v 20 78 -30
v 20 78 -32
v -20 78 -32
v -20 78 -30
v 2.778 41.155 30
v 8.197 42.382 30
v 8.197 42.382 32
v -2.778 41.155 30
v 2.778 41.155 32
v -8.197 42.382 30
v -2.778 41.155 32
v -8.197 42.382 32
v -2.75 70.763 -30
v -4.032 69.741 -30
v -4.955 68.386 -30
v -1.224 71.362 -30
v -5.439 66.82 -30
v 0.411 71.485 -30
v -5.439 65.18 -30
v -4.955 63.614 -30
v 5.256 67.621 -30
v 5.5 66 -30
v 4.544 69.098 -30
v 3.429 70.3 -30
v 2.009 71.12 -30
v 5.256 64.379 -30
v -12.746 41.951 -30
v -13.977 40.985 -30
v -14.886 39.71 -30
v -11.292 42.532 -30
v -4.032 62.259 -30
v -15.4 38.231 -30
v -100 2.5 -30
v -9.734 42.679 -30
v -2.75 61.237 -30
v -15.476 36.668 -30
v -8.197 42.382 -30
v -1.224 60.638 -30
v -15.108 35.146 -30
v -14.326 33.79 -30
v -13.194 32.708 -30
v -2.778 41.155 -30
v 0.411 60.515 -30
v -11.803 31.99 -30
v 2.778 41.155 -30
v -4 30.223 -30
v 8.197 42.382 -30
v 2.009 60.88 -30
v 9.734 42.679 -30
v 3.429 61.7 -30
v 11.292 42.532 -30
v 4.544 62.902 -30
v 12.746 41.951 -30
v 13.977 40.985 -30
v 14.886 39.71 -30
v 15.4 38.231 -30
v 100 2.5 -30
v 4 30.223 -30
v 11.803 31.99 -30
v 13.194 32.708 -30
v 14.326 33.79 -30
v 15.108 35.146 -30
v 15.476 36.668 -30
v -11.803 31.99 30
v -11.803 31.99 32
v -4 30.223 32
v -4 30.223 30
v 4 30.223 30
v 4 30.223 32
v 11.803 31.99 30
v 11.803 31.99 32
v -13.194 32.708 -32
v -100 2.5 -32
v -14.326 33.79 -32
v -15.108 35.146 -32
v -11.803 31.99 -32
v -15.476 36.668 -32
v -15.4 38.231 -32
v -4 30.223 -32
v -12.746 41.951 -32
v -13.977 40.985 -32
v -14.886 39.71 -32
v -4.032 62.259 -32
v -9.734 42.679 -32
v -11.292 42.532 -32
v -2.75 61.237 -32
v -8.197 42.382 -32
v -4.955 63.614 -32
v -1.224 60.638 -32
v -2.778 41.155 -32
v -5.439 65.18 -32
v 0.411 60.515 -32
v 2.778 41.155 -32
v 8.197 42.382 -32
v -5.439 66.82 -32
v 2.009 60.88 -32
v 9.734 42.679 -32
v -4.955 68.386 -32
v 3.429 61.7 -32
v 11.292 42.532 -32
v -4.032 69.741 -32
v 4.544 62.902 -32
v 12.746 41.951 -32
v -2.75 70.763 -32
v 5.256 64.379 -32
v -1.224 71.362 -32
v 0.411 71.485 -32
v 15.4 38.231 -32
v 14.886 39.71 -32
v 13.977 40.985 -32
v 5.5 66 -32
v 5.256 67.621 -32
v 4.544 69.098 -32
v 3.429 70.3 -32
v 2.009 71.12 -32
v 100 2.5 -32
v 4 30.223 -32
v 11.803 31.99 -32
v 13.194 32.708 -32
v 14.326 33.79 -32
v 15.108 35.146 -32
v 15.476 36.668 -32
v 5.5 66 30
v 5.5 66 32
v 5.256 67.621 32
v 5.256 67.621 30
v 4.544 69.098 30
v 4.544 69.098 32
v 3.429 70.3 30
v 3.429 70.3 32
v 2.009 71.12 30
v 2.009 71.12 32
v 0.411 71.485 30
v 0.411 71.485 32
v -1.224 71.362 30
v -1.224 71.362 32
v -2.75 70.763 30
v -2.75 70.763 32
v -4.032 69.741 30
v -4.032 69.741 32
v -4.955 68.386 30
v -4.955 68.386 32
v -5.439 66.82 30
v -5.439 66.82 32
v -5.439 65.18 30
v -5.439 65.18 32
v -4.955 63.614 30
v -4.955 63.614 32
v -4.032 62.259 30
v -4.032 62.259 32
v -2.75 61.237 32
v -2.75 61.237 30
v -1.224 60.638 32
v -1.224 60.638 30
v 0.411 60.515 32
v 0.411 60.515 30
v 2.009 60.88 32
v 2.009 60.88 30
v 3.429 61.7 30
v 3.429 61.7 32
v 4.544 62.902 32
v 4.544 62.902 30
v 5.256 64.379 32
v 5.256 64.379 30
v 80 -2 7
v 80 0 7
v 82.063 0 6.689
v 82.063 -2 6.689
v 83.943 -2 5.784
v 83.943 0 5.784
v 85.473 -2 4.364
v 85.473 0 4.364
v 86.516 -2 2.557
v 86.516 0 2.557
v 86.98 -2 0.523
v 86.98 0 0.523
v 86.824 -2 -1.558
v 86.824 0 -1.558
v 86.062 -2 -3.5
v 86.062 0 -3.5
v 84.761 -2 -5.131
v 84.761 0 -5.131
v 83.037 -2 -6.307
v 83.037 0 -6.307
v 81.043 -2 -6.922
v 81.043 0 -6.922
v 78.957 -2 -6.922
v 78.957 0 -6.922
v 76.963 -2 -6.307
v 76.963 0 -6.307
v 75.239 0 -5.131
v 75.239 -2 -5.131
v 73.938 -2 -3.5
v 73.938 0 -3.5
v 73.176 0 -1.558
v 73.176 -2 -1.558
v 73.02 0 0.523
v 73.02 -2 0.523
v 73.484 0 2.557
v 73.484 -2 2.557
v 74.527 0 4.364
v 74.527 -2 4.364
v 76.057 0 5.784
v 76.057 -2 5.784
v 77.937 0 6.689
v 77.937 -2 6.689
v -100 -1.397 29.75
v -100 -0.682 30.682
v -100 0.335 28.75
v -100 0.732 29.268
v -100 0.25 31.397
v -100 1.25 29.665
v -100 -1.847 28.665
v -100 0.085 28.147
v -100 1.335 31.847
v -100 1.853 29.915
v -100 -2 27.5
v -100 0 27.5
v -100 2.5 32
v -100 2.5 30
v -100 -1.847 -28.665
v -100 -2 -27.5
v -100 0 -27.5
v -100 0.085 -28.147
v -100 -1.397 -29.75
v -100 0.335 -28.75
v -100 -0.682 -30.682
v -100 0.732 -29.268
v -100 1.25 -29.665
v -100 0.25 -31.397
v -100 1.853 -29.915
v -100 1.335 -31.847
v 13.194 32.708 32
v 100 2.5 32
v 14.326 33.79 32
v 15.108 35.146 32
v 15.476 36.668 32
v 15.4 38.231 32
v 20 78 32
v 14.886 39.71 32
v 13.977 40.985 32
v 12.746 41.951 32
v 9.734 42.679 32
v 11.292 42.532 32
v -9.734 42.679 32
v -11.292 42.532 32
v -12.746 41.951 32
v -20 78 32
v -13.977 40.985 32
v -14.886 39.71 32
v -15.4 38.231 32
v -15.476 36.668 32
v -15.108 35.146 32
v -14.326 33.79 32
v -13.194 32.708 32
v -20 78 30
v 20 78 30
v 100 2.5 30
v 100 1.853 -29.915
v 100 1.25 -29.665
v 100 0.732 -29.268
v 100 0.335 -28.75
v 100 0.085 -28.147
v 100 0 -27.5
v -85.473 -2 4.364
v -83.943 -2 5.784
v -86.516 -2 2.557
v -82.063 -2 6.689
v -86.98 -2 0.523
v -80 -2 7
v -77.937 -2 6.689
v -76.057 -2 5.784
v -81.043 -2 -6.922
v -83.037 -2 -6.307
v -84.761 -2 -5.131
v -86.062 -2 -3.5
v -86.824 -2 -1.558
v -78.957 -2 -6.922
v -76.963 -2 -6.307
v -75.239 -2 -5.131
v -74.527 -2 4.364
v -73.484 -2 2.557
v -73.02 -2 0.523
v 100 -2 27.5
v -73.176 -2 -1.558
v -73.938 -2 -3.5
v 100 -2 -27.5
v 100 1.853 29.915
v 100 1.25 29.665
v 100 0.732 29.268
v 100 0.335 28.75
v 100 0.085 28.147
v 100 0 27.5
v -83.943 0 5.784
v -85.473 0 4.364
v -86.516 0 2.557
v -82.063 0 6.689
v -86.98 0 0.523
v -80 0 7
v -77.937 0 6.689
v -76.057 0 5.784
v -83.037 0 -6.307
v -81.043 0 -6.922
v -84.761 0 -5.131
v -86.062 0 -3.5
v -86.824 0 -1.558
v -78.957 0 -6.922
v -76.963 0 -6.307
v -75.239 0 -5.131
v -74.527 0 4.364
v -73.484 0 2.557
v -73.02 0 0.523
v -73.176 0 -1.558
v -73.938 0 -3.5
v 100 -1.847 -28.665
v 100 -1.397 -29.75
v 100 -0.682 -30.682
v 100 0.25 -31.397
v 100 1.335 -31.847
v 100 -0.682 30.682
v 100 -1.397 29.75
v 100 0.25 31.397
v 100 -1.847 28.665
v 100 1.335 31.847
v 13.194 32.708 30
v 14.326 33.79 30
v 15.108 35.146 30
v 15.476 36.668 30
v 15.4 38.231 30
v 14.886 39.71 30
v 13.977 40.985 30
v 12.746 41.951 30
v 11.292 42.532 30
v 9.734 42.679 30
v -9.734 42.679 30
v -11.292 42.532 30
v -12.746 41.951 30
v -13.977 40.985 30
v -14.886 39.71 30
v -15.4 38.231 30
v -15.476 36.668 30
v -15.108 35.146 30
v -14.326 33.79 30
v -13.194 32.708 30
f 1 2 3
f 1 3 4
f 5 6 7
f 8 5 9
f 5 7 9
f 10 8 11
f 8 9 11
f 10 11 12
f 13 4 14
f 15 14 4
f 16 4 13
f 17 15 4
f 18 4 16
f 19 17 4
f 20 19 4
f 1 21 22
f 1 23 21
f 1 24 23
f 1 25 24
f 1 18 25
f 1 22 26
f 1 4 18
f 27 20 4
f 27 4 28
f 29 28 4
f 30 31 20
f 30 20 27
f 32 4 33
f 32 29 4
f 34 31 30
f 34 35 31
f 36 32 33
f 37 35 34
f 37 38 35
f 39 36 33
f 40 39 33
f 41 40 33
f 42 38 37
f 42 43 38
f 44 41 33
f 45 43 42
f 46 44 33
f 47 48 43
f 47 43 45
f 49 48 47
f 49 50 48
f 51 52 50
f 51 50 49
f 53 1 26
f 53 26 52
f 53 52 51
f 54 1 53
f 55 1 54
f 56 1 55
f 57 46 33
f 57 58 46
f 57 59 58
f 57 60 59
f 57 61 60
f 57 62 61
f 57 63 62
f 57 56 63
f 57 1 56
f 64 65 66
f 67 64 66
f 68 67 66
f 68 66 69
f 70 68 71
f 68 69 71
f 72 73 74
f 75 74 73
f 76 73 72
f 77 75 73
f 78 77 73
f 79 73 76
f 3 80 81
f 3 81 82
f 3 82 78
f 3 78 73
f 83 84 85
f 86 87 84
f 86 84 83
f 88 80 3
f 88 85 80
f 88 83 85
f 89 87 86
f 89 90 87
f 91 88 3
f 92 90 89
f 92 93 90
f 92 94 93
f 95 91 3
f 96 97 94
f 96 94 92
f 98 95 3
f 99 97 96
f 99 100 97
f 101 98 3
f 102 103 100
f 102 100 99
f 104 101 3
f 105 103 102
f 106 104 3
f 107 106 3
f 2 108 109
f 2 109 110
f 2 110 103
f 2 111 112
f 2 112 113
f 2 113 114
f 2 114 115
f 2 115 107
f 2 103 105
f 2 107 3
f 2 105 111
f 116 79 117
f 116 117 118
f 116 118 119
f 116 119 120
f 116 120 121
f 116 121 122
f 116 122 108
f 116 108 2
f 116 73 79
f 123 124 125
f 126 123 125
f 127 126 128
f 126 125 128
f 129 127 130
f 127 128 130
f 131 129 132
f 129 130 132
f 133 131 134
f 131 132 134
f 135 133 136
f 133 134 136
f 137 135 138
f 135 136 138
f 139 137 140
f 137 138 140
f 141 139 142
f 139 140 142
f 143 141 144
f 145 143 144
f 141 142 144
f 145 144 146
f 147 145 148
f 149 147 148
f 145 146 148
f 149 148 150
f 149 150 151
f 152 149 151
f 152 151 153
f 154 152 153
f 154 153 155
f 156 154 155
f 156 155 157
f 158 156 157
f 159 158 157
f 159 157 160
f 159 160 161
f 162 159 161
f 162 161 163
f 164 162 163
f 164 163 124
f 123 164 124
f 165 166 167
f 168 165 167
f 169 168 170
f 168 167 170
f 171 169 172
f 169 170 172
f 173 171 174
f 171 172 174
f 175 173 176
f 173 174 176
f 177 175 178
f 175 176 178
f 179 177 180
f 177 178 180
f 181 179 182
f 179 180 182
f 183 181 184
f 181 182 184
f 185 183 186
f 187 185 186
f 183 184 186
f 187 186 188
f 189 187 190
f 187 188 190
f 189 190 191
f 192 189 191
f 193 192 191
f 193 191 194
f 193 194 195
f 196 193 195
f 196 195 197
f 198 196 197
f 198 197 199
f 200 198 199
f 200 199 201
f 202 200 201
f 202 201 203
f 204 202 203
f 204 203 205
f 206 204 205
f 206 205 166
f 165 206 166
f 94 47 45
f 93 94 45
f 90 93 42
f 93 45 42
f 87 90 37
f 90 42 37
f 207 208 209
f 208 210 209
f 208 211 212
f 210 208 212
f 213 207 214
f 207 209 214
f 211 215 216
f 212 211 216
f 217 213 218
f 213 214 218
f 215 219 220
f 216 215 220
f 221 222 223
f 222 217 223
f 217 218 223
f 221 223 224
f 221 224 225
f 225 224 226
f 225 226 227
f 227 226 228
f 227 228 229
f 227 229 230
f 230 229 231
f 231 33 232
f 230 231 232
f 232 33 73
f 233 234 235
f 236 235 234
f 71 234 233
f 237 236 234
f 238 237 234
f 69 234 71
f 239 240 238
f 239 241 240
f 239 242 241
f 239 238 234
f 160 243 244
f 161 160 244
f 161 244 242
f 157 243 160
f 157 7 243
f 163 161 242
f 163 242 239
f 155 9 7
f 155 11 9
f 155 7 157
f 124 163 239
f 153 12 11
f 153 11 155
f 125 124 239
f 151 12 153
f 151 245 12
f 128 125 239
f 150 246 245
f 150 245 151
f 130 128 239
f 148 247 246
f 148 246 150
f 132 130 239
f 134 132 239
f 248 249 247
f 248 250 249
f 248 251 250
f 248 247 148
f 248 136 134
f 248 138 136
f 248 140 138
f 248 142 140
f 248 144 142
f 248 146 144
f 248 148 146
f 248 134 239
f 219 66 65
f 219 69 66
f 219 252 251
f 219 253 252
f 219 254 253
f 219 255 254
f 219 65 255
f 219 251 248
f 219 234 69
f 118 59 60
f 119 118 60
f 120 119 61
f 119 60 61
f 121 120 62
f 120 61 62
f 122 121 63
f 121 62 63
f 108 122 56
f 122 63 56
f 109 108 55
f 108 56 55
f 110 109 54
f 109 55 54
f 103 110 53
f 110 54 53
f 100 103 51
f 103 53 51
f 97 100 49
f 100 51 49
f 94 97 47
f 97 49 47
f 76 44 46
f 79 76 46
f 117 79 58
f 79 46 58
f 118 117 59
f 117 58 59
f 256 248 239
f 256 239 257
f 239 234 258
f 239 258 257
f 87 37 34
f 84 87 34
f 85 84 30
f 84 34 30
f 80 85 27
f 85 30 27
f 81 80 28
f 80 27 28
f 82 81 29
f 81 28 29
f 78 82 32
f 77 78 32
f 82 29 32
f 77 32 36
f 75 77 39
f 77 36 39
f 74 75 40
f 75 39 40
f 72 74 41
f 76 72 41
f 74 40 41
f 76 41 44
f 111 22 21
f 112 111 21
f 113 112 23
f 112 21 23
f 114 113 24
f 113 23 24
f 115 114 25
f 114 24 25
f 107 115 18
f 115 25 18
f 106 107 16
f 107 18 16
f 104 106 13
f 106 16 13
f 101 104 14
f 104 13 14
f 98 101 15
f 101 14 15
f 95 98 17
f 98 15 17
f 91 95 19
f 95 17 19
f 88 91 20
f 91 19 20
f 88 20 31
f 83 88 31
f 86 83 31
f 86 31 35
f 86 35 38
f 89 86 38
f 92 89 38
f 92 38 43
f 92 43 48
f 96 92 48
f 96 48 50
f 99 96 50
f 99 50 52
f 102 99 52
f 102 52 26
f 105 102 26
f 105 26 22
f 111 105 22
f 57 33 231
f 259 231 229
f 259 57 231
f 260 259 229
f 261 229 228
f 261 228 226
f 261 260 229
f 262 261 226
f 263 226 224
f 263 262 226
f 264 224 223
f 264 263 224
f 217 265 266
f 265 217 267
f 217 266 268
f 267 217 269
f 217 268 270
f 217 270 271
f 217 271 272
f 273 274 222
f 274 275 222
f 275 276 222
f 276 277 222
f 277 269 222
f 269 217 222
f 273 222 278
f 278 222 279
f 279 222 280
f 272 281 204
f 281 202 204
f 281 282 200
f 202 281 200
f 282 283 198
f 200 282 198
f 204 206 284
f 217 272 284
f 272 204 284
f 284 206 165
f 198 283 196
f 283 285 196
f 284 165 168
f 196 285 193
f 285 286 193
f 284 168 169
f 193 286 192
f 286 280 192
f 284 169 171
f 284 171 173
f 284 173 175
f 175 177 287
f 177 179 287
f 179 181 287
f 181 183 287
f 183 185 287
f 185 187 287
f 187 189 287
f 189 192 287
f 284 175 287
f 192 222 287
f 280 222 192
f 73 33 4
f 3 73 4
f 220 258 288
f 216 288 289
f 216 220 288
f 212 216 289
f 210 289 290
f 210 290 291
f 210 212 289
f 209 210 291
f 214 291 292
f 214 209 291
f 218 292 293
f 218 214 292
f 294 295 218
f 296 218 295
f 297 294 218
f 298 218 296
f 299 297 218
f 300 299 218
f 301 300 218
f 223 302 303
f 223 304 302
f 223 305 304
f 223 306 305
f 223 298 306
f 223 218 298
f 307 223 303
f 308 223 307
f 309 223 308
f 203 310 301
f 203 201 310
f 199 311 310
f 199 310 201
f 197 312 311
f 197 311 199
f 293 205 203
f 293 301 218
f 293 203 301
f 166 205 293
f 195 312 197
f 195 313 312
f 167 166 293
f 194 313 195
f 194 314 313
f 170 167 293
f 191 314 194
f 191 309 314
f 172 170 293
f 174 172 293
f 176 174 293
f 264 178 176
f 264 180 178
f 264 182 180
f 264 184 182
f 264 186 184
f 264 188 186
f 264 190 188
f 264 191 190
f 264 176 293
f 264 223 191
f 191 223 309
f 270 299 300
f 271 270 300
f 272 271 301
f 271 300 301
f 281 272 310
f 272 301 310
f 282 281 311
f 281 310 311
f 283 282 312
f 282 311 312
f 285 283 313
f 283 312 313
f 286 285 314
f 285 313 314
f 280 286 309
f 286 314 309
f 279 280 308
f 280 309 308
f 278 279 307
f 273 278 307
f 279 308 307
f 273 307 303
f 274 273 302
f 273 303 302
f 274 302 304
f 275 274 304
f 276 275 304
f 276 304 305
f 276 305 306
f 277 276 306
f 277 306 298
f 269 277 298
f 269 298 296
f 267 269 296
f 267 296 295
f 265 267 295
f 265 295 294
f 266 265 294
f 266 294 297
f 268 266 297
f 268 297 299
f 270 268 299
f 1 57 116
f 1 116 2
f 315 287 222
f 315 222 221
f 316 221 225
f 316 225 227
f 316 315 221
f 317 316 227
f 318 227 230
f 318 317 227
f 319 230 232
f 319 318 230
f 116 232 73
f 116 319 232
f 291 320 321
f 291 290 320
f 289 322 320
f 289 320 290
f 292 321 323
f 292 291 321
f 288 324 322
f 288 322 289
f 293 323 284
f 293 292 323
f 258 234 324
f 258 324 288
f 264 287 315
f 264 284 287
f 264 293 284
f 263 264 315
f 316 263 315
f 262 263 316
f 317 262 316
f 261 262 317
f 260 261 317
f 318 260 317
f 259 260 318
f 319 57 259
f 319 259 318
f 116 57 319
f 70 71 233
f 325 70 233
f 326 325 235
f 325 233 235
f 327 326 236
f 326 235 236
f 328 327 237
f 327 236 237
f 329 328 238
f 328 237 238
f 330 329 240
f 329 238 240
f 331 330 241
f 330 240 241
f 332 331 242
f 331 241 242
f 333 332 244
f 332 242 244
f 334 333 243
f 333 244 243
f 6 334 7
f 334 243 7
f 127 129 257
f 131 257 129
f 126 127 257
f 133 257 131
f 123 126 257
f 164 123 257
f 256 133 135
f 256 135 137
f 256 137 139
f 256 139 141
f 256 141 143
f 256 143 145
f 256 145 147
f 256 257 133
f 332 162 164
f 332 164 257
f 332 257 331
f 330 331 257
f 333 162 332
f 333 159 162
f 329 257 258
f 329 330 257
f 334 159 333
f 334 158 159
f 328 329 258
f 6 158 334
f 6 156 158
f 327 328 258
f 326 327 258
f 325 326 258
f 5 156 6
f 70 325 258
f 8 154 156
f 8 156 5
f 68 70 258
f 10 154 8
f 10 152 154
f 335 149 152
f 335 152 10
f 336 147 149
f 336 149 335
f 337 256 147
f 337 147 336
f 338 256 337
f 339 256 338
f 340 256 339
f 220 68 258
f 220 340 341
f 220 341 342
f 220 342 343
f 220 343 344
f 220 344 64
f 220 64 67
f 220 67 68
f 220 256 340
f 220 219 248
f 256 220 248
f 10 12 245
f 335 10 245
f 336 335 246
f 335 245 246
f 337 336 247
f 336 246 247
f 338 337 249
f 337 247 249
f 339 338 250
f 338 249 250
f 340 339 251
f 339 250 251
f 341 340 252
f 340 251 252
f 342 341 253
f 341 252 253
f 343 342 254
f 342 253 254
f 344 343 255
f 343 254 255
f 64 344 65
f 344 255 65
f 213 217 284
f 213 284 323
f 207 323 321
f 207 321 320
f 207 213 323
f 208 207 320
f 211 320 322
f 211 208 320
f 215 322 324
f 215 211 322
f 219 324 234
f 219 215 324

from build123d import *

# Parameters (mm, degrees)
SKETCH9_W                      = 200
SKETCH9_H                      = 64
BASE_FLANGE2_DEPTH             = 2
EDGE_FLANGE2_STRIP_W           = 13
EDGE_FLANGE2_STRIP_H           = 2
EDGE_FLANGE2_STRIP_CUT_DEPTH   = 200
EDGE_FLANGE2_STRIP_2_W         = 13
EDGE_FLANGE2_STRIP_2_H         = 2
EDGE_FLANGE2_STRIP_CUT_2_DEPTH = 200
EDGE_FLANGE2_DEPTH             = 200
EDGE_FLANGE2_BEND_DEPTH        = 200
CUT_EXTRUDE1_DEPTH             = 143.056326857
SKETCH21_R                     = 5.5
CUT_EXTRUDE2_DEPTH             = 143.056326857
CUT_EXTRUDE3_DEPTH             = 143.056326857
SKETCH23_R                     = 7
CUT_EXTRUDE4_DEPTH             = 10


# Sheet-metal steps are written as plain solids
with BuildPart() as part:
    # Sketch9 → Base-Flange2 (new body)
    with BuildSketch(Plane(origin=(0, 0, 0), x_dir=(1, 0, 0), z_dir=(0, 1, 0))):
        Rectangle(SKETCH9_W, SKETCH9_H)
    extrude(amount=-BASE_FLANGE2_DEPTH)

    # Edge-Flange2 strip (across the edge) → Edge-Flange2 strip cut (cut)
    with BuildSketch(Plane(origin=(-100, 0, 32), x_dir=(0, 0, -1), z_dir=(1, 0, 0))):
        with Locations((-2, -1)):
            Rectangle(EDGE_FLANGE2_STRIP_W, EDGE_FLANGE2_STRIP_H)
    extrude(amount=EDGE_FLANGE2_STRIP_CUT_DEPTH, mode=Mode.SUBTRACT)

    # Edge-Flange2 strip 2 (across the edge) → Edge-Flange2 strip cut 2 (cut)
    with BuildSketch(Plane(origin=(100, 0, -32), x_dir=(0, 0, 1), z_dir=(-1, 0, 0))):
        with Locations((-2, -1)):
            Rectangle(EDGE_FLANGE2_STRIP_2_W, EDGE_FLANGE2_STRIP_2_H)
    extrude(amount=EDGE_FLANGE2_STRIP_CUT_2_DEPTH, mode=Mode.SUBTRACT)

    # Edge-Flange2 section (across the edge) → Edge-Flange2 (add)
    with BuildSketch(Plane(origin=(-100, 0, 32), x_dir=(0, 0, -1), z_dir=(1, 0, 0))):
        with BuildLine():
            Line((0, 2.5), (0, 78))
            Line((0, 78), (2, 78))
            Line((2, 78), (2, 2.5))
            ThreePointArc((2, 2.5), (2.732233047, 0.732233047), (4.5, 0))
            Line((4.5, 0), (4.5, -2))
            ThreePointArc((4.5, -2), (1.318019485, -0.681980515), (0, 2.5))
        make_face()
    extrude(amount=EDGE_FLANGE2_DEPTH)

    # Edge-Flange2 section 2 (across the edge) → Edge-Flange2 bend (add)
    with BuildSketch(Plane(origin=(100, 0, -32), x_dir=(0, 0, 1), z_dir=(-1, 0, 0))):
        with BuildLine():
            Line((0, 2.5), (0, 78))
            Line((0, 78), (2, 78))
            Line((2, 78), (2, 2.5))
            ThreePointArc((2, 2.5), (2.732233047, 0.732233047), (4.5, 0))
            Line((4.5, 0), (4.5, -2))
            ThreePointArc((4.5, -2), (1.318019485, -0.681980515), (0, 2.5))
        make_face()
    extrude(amount=EDGE_FLANGE2_BEND_DEPTH)

    # Sketch20 → Cut-Extrude1 (cut, through all)
    with BuildSketch(Plane.XY.offset(32)):
        Polygon((-100, 2.5), (-20, 78), (-100, 78), align=None)
    cut_extrude1 = extrude(amount=-CUT_EXTRUDE1_DEPTH, mode=Mode.SUBTRACT)

    # Mirror1: Cut-Extrude1 across plane
    add(cut_extrude1.mirror(Plane(origin=(0, 0, 0), x_dir=(0, 0, 1), z_dir=(1, 0, 0))), mode=Mode.SUBTRACT)

    # Sketch21 → Cut-Extrude2 (cut, through all)
    with BuildSketch(Plane.XY.offset(32)):
        with Locations((0, 66)):
            Circle(SKETCH21_R)
    extrude(amount=-CUT_EXTRUDE2_DEPTH, mode=Mode.SUBTRACT)

    # Sketch22 → Cut-Extrude3 (cut, through all)
    with BuildSketch(Plane.XY.offset(32)):
        with BuildLine():
            ThreePointArc((-11.803278689, 31.989963067), (0, 30), (11.803278689, 31.989963067))
            ThreePointArc((11.803278689, 31.989963067), (15.195977865, 38.98921962), (8.196721311, 42.381918796))
            ThreePointArc((8.196721311, 42.381918796), (0, 41), (-8.196721311, 42.381918796))
            ThreePointArc((-8.196721311, 42.381918796), (-15.195977865, 38.98921962), (-11.803278689, 31.989963067))
        make_face()
    extrude(amount=-CUT_EXTRUDE3_DEPTH, mode=Mode.SUBTRACT)

    # Sketch23 → Cut-Extrude4 (cut)
    with BuildSketch(Plane(origin=(0, 0, 0), x_dir=(1, 0, 0), z_dir=(0, 1, 0))):
        with Locations(Location((-80, 0, 0), (0, 0, 270))):
            Circle(SKETCH23_R)
        with Locations(Location((80, 0, 0), (0, 0, 270))):
            Circle(SKETCH23_R)
    extrude(amount=-CUT_EXTRUDE4_DEPTH, mode=Mode.SUBTRACT)


solid = part.part
